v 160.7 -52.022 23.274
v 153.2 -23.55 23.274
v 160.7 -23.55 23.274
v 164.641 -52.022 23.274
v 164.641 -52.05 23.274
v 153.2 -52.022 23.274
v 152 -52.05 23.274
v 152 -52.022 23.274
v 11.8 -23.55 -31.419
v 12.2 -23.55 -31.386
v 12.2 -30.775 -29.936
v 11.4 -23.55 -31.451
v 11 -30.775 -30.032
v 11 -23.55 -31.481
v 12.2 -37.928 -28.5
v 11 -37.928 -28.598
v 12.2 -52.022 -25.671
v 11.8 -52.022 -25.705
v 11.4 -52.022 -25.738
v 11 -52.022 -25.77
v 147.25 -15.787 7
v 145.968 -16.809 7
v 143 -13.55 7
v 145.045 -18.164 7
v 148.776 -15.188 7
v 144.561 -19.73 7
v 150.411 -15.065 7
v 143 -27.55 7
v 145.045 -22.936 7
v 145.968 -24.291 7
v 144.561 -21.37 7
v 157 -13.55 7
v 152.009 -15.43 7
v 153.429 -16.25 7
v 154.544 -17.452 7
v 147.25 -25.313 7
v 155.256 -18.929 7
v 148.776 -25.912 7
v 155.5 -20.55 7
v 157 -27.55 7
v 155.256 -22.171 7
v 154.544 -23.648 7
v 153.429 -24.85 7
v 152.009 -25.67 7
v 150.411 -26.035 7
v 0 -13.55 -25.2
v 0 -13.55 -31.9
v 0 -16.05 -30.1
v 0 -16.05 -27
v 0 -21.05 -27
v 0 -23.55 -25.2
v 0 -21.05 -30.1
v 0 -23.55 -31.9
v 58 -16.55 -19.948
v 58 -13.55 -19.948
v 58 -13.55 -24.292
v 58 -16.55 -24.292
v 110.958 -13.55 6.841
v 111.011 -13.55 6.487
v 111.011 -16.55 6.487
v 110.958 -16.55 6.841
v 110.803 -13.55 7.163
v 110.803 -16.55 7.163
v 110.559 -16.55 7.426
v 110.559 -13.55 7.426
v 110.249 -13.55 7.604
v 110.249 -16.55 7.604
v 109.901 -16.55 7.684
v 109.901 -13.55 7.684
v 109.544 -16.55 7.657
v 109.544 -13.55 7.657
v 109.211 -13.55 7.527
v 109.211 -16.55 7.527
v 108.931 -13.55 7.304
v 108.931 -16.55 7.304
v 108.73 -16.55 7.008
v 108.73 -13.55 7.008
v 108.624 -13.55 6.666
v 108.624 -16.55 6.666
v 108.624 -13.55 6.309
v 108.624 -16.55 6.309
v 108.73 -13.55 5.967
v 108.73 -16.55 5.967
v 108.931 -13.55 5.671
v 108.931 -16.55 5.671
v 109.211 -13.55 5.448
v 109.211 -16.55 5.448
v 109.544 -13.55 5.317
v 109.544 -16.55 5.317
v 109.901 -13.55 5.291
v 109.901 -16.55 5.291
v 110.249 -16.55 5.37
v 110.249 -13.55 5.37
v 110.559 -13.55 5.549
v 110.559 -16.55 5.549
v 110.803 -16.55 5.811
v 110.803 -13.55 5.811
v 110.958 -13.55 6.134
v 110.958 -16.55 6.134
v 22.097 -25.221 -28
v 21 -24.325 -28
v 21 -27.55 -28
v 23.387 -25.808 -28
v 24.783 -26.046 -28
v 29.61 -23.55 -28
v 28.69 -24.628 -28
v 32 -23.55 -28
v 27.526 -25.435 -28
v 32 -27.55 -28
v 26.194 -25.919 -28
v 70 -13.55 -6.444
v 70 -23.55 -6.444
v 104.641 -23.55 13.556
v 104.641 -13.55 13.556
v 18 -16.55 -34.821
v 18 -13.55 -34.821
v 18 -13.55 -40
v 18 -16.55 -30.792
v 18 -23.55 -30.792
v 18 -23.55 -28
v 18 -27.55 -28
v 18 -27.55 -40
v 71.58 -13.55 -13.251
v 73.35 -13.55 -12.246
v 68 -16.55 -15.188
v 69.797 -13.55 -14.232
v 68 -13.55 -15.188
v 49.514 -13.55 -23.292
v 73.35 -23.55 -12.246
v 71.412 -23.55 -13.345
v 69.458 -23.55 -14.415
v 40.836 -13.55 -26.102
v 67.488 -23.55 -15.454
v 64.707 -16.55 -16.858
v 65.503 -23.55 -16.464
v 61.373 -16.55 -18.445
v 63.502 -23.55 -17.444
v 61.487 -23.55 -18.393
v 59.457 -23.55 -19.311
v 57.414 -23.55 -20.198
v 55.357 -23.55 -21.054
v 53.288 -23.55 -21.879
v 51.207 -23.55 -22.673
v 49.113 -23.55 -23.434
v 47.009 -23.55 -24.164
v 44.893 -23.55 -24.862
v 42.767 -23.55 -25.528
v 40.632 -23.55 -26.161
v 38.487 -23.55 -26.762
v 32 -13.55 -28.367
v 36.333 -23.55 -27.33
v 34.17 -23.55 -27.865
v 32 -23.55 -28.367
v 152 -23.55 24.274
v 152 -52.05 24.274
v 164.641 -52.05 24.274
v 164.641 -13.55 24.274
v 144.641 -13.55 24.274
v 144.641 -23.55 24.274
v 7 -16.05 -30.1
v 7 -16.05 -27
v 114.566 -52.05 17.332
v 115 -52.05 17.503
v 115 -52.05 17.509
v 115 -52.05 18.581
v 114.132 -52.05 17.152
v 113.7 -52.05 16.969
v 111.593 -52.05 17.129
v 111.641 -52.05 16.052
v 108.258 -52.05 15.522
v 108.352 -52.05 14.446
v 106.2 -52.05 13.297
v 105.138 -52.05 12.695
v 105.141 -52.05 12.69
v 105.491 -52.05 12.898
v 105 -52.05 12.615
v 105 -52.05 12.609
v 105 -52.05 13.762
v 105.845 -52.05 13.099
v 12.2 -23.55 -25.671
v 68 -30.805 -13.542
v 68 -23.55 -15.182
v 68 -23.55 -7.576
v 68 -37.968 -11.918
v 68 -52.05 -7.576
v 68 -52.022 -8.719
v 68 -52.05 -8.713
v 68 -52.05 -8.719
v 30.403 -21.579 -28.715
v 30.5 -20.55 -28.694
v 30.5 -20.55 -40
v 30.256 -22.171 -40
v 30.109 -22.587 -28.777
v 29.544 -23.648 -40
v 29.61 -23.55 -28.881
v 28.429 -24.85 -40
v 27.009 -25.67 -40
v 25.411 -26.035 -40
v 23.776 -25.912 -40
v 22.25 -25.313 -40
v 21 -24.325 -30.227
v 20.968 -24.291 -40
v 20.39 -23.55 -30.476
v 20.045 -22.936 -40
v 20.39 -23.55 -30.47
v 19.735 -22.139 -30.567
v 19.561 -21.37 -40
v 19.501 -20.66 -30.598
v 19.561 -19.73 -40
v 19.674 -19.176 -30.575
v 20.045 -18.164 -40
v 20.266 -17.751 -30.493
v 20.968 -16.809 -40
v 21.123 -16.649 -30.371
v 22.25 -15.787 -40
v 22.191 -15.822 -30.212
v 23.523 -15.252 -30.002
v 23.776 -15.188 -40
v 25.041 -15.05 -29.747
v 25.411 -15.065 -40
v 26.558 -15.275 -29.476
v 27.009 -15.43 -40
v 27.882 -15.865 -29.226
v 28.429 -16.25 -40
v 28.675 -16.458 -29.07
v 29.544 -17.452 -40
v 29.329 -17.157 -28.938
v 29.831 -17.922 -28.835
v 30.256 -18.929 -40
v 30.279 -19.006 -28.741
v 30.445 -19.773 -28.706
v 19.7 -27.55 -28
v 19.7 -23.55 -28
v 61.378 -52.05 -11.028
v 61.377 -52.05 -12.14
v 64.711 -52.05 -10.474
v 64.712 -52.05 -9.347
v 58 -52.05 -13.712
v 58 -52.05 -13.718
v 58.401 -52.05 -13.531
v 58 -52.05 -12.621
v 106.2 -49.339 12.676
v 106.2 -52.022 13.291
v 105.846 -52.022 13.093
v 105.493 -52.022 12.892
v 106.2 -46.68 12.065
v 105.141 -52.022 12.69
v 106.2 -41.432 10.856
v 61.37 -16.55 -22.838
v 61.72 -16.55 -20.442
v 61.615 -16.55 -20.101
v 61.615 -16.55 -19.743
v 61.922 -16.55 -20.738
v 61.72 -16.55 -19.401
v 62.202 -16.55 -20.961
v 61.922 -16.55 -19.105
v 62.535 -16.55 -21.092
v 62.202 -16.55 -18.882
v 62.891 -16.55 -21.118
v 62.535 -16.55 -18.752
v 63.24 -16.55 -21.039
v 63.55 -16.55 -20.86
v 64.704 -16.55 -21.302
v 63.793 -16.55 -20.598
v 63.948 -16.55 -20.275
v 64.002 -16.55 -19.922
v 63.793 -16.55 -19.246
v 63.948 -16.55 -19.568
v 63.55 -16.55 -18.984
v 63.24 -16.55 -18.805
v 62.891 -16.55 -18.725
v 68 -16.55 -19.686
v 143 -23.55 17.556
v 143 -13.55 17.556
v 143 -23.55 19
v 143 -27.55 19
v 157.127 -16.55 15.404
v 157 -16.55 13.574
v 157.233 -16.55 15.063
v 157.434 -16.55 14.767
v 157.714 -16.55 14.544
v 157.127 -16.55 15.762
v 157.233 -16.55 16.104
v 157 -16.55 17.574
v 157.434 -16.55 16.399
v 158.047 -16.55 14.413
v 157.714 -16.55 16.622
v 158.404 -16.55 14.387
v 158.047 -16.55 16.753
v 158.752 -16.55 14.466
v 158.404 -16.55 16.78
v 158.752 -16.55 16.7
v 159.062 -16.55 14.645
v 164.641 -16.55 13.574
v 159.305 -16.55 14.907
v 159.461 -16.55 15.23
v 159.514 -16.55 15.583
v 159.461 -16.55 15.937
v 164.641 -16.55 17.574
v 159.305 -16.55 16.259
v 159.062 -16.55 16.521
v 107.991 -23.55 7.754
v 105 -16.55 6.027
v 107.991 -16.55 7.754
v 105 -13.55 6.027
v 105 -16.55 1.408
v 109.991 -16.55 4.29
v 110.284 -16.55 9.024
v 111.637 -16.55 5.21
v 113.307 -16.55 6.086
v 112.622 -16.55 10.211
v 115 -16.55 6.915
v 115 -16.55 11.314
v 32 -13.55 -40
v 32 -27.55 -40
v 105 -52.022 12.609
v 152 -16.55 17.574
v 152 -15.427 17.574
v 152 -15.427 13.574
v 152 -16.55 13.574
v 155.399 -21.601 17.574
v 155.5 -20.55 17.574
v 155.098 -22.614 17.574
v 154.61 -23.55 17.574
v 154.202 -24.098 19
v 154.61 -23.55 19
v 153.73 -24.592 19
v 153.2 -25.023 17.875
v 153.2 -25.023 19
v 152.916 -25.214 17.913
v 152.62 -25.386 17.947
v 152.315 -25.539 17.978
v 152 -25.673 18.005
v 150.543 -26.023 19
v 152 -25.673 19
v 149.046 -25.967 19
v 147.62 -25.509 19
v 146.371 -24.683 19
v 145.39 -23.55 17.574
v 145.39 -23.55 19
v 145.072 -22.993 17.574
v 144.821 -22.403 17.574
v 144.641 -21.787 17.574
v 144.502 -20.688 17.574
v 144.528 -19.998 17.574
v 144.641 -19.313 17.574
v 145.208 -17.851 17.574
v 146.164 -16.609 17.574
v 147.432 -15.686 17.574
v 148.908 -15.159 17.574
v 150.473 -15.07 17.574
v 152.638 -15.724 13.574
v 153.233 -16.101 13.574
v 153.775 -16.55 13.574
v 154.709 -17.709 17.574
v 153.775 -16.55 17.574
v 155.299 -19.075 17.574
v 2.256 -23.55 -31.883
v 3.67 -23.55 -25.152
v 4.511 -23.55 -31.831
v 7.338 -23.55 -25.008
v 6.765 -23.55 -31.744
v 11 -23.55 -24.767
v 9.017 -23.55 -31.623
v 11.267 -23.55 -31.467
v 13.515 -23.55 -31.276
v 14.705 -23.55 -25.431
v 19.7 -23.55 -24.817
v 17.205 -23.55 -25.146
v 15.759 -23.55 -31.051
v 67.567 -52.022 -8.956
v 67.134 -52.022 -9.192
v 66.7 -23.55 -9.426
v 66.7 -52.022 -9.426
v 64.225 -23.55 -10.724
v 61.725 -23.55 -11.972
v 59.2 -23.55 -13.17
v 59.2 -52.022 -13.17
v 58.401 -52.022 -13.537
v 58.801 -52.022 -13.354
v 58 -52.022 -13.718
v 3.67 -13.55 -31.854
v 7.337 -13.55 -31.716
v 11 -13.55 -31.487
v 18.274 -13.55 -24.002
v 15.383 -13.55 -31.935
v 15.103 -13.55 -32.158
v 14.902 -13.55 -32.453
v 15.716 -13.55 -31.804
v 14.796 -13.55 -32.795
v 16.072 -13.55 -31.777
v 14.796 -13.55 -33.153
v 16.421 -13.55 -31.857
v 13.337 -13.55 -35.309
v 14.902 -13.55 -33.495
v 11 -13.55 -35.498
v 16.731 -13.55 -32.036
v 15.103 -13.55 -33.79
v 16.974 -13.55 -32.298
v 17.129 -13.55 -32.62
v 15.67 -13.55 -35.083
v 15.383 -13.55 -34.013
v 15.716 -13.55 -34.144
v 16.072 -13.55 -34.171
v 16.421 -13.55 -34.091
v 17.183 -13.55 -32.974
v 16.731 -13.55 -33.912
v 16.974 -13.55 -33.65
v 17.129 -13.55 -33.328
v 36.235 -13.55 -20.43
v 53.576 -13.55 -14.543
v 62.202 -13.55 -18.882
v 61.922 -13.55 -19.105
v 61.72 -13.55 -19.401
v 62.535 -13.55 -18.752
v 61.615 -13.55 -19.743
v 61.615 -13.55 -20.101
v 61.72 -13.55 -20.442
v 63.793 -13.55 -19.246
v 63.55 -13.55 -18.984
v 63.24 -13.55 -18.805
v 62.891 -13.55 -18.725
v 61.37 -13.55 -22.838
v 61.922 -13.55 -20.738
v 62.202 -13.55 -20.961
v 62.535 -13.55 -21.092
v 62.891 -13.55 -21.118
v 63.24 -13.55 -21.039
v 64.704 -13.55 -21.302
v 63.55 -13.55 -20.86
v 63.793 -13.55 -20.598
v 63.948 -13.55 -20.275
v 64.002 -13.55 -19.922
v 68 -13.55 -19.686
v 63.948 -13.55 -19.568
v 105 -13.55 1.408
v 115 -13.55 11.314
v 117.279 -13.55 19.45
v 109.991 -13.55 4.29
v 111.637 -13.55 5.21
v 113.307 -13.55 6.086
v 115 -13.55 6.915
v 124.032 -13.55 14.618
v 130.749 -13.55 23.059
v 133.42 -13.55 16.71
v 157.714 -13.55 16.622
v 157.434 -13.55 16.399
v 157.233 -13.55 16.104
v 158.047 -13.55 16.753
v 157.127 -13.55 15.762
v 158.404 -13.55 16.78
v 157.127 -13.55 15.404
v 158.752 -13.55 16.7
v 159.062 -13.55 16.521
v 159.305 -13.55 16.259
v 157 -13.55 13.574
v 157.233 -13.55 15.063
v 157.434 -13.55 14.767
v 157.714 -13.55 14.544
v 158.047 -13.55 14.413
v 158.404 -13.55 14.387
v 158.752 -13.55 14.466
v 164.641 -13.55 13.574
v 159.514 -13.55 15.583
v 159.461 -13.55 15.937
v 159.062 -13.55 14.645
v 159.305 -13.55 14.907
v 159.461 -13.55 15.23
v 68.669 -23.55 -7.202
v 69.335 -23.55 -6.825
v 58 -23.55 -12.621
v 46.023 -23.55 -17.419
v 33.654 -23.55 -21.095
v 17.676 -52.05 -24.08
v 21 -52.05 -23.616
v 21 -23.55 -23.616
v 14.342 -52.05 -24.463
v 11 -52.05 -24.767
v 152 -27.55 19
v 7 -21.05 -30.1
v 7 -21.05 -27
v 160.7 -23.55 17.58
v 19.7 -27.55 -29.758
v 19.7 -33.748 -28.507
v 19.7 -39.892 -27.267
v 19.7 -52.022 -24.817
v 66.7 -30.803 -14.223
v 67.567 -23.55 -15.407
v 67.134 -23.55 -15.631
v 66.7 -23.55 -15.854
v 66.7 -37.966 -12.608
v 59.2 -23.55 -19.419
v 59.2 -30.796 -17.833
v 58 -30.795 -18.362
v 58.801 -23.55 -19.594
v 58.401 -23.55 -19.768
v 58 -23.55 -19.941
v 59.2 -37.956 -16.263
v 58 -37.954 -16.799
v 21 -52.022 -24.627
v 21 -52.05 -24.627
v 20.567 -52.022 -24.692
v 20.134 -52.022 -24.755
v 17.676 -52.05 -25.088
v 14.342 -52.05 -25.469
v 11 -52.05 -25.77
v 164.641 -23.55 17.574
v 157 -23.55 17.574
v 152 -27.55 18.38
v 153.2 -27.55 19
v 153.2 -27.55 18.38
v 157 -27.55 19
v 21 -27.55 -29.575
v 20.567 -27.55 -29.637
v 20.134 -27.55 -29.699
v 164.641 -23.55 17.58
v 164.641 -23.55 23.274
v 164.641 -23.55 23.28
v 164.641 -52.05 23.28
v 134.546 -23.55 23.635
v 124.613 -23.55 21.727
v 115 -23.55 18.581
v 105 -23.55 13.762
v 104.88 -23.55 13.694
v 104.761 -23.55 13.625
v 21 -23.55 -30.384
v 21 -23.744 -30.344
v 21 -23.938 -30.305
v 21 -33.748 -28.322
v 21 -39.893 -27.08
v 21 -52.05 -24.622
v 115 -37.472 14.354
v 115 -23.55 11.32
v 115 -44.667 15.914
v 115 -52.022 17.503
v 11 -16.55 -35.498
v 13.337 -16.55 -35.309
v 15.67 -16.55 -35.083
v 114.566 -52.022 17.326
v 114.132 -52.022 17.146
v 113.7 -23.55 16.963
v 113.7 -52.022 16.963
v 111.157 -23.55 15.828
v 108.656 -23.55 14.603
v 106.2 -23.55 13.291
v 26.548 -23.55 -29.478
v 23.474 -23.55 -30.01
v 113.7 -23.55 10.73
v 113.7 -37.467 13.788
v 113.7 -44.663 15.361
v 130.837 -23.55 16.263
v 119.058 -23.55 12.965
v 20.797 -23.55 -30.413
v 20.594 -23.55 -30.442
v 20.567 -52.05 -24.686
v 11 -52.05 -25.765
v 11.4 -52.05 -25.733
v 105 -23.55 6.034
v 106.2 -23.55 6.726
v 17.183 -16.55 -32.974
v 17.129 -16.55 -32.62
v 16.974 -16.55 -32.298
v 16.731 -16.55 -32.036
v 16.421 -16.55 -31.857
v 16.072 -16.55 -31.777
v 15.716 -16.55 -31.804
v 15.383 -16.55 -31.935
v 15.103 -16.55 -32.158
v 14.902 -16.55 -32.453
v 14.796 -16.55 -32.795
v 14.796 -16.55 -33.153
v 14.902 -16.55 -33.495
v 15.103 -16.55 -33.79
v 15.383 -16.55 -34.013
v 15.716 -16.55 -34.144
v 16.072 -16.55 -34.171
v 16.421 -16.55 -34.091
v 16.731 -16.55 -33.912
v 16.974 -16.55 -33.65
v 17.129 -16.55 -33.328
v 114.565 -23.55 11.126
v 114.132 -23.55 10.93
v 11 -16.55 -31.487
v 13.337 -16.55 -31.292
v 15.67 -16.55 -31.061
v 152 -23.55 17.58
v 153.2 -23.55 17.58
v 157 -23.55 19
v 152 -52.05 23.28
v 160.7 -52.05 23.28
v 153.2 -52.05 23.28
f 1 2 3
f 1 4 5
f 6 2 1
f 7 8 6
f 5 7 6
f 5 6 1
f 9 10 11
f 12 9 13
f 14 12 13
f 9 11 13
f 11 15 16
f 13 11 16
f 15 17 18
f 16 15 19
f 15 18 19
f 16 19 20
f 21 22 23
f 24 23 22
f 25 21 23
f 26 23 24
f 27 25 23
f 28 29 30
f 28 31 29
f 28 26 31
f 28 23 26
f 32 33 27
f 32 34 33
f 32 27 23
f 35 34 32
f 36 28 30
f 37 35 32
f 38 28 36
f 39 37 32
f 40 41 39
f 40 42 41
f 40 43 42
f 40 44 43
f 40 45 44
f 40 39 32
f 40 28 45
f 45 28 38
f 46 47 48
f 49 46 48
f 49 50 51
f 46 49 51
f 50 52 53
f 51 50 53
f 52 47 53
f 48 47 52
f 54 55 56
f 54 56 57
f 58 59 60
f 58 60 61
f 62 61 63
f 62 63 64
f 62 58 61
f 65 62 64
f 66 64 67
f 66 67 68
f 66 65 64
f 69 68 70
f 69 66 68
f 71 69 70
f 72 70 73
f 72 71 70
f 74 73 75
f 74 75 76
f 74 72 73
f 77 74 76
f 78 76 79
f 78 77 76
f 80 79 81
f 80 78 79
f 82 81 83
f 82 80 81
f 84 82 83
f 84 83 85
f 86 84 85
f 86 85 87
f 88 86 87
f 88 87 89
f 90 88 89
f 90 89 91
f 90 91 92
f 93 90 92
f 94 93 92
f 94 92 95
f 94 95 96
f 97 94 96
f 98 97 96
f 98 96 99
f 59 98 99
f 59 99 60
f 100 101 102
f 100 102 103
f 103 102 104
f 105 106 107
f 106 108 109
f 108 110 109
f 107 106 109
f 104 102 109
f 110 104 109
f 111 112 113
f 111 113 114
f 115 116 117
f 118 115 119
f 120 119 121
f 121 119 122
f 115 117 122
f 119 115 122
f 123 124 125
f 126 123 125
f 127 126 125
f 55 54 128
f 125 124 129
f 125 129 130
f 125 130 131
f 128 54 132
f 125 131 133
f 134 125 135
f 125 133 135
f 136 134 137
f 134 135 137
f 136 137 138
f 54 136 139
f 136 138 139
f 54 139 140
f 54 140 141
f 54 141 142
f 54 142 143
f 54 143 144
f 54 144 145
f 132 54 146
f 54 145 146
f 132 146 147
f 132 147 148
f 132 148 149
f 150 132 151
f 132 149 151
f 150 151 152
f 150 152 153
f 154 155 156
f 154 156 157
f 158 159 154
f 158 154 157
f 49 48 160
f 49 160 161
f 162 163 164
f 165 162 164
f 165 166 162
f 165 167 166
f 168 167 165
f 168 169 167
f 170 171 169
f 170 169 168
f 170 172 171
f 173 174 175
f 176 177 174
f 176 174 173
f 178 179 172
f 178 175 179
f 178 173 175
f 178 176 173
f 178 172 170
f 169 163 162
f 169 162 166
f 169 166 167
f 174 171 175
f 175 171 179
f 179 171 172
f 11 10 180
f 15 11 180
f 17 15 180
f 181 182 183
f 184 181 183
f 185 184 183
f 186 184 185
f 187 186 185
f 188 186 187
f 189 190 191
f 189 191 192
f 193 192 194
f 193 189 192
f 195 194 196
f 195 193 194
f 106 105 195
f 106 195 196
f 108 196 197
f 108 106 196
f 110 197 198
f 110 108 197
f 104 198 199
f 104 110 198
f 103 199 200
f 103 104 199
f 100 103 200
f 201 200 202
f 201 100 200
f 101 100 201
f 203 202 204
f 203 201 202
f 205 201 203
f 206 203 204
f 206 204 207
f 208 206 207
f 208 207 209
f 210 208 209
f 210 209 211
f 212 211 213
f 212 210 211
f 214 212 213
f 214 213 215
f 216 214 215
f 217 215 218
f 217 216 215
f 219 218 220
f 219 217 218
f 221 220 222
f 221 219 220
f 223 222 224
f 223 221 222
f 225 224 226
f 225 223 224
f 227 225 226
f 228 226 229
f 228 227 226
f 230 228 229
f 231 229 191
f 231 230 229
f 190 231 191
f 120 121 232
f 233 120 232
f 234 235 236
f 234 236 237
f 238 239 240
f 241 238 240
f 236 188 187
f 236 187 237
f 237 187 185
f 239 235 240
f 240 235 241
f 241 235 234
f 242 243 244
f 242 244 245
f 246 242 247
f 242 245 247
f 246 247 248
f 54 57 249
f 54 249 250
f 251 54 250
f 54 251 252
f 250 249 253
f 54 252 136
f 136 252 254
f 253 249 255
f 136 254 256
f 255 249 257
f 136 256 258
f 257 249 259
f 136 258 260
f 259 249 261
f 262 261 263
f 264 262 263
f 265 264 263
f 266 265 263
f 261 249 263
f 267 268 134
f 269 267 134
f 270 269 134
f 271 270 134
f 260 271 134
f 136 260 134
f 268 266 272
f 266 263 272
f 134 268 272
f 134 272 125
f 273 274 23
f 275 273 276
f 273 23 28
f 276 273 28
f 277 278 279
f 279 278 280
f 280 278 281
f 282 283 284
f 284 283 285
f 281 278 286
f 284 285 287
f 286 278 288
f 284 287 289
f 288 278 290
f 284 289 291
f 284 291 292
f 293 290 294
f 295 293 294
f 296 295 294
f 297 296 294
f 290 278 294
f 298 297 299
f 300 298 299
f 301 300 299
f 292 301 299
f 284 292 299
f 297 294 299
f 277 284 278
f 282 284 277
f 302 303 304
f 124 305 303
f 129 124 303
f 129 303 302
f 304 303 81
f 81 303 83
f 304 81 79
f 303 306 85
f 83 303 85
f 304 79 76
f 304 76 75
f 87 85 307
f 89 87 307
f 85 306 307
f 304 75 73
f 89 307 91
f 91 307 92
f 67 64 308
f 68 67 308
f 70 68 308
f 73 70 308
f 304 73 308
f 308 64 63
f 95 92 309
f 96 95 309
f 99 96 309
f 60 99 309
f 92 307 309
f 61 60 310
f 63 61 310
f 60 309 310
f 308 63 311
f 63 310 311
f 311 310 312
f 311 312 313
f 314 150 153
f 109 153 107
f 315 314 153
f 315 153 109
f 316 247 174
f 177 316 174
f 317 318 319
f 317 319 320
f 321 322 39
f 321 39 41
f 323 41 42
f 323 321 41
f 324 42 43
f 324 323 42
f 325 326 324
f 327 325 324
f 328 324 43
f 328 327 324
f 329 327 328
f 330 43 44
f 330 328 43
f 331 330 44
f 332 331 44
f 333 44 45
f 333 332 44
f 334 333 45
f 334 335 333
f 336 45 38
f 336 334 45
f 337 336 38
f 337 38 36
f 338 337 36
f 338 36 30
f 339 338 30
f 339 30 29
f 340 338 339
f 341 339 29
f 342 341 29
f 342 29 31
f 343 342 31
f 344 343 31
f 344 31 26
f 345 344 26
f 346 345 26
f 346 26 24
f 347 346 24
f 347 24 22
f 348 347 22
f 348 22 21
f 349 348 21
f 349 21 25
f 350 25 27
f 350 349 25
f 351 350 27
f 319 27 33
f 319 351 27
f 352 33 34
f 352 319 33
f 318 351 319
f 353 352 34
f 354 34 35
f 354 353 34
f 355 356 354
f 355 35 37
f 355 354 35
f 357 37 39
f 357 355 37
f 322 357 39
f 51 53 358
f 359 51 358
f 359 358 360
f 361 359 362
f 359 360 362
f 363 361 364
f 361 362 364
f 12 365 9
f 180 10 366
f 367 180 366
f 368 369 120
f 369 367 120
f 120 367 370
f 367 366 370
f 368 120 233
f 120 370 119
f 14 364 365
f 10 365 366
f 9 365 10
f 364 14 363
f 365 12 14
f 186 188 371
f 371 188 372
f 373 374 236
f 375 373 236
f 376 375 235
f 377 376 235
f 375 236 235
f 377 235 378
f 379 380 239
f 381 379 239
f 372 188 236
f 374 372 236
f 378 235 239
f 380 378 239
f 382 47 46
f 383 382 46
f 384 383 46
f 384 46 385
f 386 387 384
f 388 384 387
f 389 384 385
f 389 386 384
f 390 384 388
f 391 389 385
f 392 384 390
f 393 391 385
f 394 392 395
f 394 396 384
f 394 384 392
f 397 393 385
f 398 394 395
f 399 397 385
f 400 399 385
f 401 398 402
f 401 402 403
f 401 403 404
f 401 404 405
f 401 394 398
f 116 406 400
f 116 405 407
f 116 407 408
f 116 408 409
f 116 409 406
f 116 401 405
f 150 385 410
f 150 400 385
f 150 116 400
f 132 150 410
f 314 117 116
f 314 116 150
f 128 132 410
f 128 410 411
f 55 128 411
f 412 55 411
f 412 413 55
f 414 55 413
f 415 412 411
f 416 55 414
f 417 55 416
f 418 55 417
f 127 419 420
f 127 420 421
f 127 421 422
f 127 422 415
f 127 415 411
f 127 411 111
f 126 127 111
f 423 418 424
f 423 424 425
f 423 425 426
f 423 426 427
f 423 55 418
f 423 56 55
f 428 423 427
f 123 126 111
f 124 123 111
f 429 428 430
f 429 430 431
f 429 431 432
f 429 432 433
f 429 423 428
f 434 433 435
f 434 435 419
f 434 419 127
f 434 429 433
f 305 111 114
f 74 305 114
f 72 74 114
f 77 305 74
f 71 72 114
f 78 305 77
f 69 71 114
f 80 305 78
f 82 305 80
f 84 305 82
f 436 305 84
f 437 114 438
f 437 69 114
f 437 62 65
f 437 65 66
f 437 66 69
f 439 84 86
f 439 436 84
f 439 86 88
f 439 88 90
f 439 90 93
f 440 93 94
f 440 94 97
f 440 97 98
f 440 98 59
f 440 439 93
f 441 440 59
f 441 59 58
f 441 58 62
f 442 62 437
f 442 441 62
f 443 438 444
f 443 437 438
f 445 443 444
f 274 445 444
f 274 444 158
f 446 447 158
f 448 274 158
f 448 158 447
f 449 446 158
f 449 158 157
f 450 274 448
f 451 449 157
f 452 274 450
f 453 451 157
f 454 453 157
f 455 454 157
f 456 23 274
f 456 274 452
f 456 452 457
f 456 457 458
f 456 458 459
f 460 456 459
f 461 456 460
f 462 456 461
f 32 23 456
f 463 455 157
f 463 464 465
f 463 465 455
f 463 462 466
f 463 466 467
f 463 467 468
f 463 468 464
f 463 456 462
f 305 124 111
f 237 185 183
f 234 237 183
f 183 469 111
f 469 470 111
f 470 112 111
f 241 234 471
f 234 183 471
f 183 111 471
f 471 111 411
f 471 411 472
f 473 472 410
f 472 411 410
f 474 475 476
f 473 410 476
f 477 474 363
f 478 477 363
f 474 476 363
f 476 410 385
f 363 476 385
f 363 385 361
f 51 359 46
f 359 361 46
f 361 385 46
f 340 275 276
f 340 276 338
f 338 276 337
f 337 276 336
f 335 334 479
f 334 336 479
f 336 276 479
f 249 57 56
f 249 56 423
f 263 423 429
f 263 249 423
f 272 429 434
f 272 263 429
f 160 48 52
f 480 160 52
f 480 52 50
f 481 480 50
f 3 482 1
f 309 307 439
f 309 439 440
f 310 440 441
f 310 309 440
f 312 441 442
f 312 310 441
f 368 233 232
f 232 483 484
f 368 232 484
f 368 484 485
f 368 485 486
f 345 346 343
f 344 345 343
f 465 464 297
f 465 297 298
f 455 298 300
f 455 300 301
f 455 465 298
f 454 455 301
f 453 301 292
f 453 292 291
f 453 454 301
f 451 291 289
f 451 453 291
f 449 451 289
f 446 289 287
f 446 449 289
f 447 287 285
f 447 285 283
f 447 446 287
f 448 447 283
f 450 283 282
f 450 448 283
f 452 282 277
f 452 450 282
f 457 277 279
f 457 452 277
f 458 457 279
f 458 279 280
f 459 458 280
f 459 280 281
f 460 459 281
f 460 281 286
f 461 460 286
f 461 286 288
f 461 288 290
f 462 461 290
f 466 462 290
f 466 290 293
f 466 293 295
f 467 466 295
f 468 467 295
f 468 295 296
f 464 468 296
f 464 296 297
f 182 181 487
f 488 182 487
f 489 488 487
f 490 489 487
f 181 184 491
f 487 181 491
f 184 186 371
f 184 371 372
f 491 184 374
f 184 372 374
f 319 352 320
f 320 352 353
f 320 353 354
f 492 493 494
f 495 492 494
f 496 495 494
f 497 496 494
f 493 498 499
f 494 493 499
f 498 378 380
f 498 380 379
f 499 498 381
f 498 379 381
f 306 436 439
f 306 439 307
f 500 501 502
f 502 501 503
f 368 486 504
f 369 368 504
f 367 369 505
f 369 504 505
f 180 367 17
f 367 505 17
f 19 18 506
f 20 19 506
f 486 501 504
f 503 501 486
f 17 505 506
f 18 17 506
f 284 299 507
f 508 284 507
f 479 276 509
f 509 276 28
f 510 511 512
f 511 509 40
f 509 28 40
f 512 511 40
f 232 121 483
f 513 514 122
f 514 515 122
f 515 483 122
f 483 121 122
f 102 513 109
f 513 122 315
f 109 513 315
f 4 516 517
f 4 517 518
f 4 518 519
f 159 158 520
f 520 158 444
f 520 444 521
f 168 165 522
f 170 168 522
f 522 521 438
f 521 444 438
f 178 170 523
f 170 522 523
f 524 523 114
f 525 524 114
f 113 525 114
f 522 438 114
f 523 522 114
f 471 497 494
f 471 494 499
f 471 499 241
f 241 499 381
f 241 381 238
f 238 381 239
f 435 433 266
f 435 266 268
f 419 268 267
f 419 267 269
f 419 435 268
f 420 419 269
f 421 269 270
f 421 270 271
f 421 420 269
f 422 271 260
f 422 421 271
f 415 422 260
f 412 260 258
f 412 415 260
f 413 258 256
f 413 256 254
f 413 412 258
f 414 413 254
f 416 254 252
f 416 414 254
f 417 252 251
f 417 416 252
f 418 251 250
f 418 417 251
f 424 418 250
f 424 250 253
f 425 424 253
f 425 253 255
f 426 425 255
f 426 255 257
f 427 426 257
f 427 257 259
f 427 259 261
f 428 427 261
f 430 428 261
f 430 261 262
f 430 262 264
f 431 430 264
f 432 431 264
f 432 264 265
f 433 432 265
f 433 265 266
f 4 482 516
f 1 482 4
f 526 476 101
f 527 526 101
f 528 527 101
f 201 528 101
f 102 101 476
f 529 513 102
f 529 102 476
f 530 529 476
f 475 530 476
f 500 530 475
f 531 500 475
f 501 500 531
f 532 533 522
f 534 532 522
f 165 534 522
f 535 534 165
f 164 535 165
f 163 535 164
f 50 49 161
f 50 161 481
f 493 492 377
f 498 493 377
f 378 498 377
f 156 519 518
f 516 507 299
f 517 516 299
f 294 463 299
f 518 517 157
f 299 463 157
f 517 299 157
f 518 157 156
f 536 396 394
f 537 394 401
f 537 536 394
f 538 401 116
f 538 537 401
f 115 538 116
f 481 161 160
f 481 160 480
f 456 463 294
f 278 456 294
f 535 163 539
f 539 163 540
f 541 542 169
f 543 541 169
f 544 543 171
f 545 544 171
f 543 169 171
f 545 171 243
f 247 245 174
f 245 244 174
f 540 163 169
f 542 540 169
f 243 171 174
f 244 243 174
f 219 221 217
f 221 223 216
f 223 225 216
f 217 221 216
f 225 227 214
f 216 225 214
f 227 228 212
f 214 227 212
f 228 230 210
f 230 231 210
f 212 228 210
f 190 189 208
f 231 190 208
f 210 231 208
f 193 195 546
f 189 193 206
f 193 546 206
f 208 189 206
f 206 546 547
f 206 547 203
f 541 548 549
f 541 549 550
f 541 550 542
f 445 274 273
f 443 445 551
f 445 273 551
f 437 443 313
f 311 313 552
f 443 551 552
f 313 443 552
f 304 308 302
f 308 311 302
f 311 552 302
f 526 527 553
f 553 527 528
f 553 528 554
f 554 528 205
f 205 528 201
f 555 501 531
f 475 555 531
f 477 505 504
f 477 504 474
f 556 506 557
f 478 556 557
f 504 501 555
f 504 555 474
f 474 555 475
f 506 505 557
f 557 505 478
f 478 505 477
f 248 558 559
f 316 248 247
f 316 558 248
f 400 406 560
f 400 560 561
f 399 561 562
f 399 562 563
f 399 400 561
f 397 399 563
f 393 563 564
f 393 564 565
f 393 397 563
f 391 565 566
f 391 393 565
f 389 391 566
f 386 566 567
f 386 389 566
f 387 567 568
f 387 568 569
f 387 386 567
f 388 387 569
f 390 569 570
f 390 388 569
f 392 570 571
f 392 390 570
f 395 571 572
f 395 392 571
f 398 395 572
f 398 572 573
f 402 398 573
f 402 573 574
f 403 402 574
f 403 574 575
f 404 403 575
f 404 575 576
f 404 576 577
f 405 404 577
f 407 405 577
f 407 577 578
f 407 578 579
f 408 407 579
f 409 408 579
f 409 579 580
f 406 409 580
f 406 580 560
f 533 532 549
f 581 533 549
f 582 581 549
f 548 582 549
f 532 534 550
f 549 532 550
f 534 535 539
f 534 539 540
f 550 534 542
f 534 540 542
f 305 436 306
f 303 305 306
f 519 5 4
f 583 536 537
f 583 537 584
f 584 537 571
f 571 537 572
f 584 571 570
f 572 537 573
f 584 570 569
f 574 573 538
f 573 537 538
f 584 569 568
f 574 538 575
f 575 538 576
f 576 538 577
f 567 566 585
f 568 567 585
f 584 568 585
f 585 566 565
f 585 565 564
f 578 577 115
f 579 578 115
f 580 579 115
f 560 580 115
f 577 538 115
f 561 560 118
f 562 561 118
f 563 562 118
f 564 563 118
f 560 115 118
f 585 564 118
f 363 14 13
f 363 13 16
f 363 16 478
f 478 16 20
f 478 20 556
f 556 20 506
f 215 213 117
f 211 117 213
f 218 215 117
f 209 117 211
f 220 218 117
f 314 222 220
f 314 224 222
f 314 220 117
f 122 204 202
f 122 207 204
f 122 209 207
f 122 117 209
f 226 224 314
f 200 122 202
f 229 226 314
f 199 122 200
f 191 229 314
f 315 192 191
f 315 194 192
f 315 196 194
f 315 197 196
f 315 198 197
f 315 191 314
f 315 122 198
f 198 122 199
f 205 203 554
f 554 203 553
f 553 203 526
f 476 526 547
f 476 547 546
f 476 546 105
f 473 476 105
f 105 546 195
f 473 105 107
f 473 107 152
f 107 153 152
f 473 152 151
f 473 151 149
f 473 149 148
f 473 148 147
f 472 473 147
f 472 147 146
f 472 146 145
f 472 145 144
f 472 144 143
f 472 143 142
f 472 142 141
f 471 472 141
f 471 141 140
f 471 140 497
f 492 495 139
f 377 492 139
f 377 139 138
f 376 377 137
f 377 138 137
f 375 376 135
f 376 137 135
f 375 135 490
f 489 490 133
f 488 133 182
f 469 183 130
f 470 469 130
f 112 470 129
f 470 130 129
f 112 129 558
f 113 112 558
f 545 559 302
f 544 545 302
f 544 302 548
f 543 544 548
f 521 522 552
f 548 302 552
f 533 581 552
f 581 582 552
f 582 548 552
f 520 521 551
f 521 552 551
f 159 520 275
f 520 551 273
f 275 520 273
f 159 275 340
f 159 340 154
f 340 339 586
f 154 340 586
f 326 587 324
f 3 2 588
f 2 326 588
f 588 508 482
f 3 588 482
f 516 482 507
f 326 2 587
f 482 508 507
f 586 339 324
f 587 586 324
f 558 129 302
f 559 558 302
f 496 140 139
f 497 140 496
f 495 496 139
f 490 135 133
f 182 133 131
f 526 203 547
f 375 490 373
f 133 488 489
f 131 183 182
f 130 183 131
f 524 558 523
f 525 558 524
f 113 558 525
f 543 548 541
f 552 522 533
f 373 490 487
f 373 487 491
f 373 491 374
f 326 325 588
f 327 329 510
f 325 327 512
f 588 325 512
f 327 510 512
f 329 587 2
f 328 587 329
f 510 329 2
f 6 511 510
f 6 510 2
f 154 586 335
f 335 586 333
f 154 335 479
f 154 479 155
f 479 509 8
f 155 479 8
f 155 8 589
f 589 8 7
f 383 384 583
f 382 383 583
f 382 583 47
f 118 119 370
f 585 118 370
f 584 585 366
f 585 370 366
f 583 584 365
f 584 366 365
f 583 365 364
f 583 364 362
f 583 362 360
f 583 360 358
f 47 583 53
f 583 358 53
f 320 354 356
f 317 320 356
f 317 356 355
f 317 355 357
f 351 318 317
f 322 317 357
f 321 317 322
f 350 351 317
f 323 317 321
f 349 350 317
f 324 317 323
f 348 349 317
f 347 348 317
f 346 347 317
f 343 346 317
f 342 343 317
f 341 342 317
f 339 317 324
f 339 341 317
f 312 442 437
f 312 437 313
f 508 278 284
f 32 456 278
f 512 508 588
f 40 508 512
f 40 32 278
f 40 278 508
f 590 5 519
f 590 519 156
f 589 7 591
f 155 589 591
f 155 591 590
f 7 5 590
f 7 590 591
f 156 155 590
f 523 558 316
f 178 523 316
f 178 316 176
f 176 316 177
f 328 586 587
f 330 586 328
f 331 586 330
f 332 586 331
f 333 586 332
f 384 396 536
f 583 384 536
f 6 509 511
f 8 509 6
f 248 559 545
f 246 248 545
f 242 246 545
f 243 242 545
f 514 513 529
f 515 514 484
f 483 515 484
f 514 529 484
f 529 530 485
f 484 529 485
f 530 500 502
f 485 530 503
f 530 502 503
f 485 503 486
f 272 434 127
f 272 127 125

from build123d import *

# Parameters (mm, degrees)
SKETCH038_W            = 5
SKETCH038_H            = 3.1
EXTRUDE001_DEPTH       = 7
BOX010_W               = 200
BOX010_H               = 100
BOX010_DEPTH           = 100
BOX008_W               = 20
BOX008_H               = 20
BOX008_DEPTH           = 20
BOX008_PLACEMENT_ANGLE = 30
BOX011_W               = 14
BOX011_H               = 14
BOX011_DEPTH           = 20
SKETCH039_R            = 5.5
POCKET007_DEPTH        = 20.001
BOX014_W               = 7.5
BOX014_H               = 60
BOX014_DEPTH           = 200
ARRAY002_X_COUNT       = 7
ARRAY002_X_PITCH       = 47
BOX006_W               = 37
BOX006_H               = 60
BOX006_DEPTH           = 200
ARRAY_X_COUNT          = 6
ARRAY_X_PITCH          = 47
BOX012_W               = 14
BOX012_H               = 14
BOX012_DEPTH           = 12
SKETCH032_R            = 5.5
POCKET009_DEPTH        = 12.001
BOX013_W               = 14
BOX013_H               = 14
BOX013_DEPTH           = 12
SKETCH034_R            = 5.5
POCKET008_DEPTH        = 12.001
BOX009_W               = 37
BOX009_H               = 60
BOX009_DEPTH           = 200
ARRAY001_X_COUNT       = 6
ARRAY001_X_PITCH       = 47
SKETCH035_W            = 3
SKETCH035_H            = 4
SKETCH036_R            = 1.2
POCKET006_DEPTH        = 3.001


with BuildPart() as extrude001:
    # Sketch038 → Extrude001 (new body)
    with BuildSketch(Plane.YZ):
        with Locations((13.55, -28.55)):
            Rectangle(SKETCH038_W, SKETCH038_H)
    extrude(amount=EXTRUDE001_DEPTH)


with BuildPart() as bigleft:
    # Box010 → Box010 (new body)
    with BuildSketch(Plane(origin=(0, -50, -50), x_dir=(1, 0, 0), z_dir=(0, 0, 1))):
        with Locations((100, 50)):
            Rectangle(BOX010_W, BOX010_H)
    extrude(amount=BOX010_DEPTH)


with BuildPart() as pillar_cut_cube_l:
    # Box008 → Box008 (new body)
    with BuildSketch(Plane.XY):
        with Locations((10, 10)):
            Rectangle(BOX008_W, BOX008_H)
    extrude(amount=BOX008_DEPTH)


with BuildPart() as pillar_cut_cube_l_1:
    # Box008 placement: moved
    add(pillar_cut_cube_l.part.moved(Location((-127.001, 5, 20.4905))).rotate(Axis((-127.001, 5, 20.4905), (0, 1, 0)), BOX008_PLACEMENT_ANGLE))


with BuildPart() as cut011:
    # Box011 → Box011 (new body)
    with BuildSketch(Plane(origin=(-125, 8.55, 0), x_dir=(1, 0, 0), z_dir=(0, 0, 1))):
        with Locations((7, 7)):
            Rectangle(BOX011_W, BOX011_H)
    extrude(amount=BOX011_DEPTH)

    # Sketch039 → Pocket007 (cut, through all)
    with BuildSketch(Plane(origin=(-125, 8.55, 20), x_dir=(1, 0, 0), z_dir=(0, 0, 1))):
        with Locations((7, 7)):
            Circle(SKETCH039_R)
    extrude(amount=-POCKET007_DEPTH, mode=Mode.SUBTRACT)

    # Cut011: cut pillar_cut_cube_l
    add(pillar_cut_cube_l_1.part, mode=Mode.SUBTRACT)


with BuildPart() as array002:
    # Box014 → Box014 (new body)
    with BuildSketch(Plane(origin=(-128.8, 18.55, -100), x_dir=(1, 0, 0), z_dir=(0, 0, 1))):
        with Locations((3.75, 30)):
            Rectangle(BOX014_W, BOX014_H)
    extrude(amount=BOX014_DEPTH)

    # Array002 X: Array002 ×7


with BuildPart() as array002_1:
    add(array002.part)
    with Locations(*[(i * ARRAY002_X_PITCH, 0, 0) for i in range(1, ARRAY002_X_COUNT)]):
        add(array002.part)


with BuildPart() as rail_cut_cube_array_b:
    # Box006 → Box006 (new body)
    with BuildSketch(Plane(origin=(-120, 18.55, -100), x_dir=(1, 0, 0), z_dir=(0, 0, 1))):
        with Locations((18.5, 30)):
            Rectangle(BOX006_W, BOX006_H)
    extrude(amount=BOX006_DEPTH)

    # Array X: rail_cut_cube_array_b ×6


with BuildPart() as rail_cut_cube_array_b_1:
    add(rail_cut_cube_array_b.part)
    with Locations(*[(i * ARRAY_X_PITCH, 0, 0) for i in range(1, ARRAY_X_COUNT)]):
        add(rail_cut_cube_array_b.part)


with BuildPart() as cut013:
    # Sweep002: sweep along a path in Sketch028
    with BuildLine(Plane.XZ) as sweep002_path:
        Line((164.641016, 24.27441), (144.641016, 24.27441))
        ThreePointArc((144.641016, 24.27441), (123.935493, 21.548477), (104.641016, 13.556443))
        Line((104.641016, 13.556443), (70, -6.443557))
        ThreePointArc((70, -6.443557), (0, -25.2), (-70, -6.443557))
        Line((-70, -6.443557), (-130.621778, 28.556443))
    # Sketch043 → Sweep002 (sweep)
    with BuildSketch(Plane.YZ.offset(164.641016)):
        Polygon((18.55, 17.58), (47.05, 23.28), (18.55, 23.28), align=None)
    sweep(path=sweep002_path.line)

    # Cut012: cut rail_cut_cube_array_b
    add(rail_cut_cube_array_b_1.part, mode=Mode.SUBTRACT)

    # Cut013: cut Array002
    add(array002_1.part, mode=Mode.SUBTRACT)


with BuildPart() as rail_cut_b:
    # Sweep: sweep along a path in Sketch028
    with BuildLine(Plane.XZ) as sweep_path:
        Line((164.641016, 24.27441), (144.641016, 24.27441))
        ThreePointArc((144.641016, 24.27441), (123.935493, 21.548477), (104.641016, 13.556443))
        Line((104.641016, 13.556443), (70, -6.443557))
        ThreePointArc((70, -6.443557), (0, -25.2), (-70, -6.443557))
        Line((-70, -6.443557), (-130.621778, 28.556443))
    # Sketch029 → Sweep (sweep)
    with BuildSketch(Plane.YZ):
        Polygon((-19.25, -25.2), (-19.25, -31.9), (-9.25, -31.9), (-9.25, -26.2), (19.25, -26.2), (19.25, -25.2), align=None)
    sweep(path=sweep_path.line)


with BuildPart() as rail_cut_b_1:
    # Sweep placement: moved
    add(rail_cut_b.part.moved(Location((0, 27.8, 0))))

    # Cut007: cut rail_cut_cube_array_b
    add(rail_cut_cube_array_b_1.part, mode=Mode.SUBTRACT)


with BuildPart() as pillar_hollow_r:
    # Box012 → Box012 (new body)
    with BuildSketch(Plane(origin=(143, 8.55, 7), x_dir=(1, 0, 0), z_dir=(0, 0, 1))):
        with Locations((7, 7)):
            Rectangle(BOX012_W, BOX012_H)
    extrude(amount=BOX012_DEPTH)

    # Sketch032 → Pocket009 (cut, through all)
    with BuildSketch(Plane(origin=(143, 8.55, 19), x_dir=(1, 0, 0), z_dir=(0, 0, 1))):
        with Locations((7, 7)):
            Circle(SKETCH032_R)
    extrude(amount=-POCKET009_DEPTH, mode=Mode.SUBTRACT)


with BuildPart() as pillar_hollow_m:
    # Box013 → Box013 (new body)
    with BuildSketch(Plane(origin=(18, 8.55, -40), x_dir=(1, 0, 0), z_dir=(0, 0, 1))):
        with Locations((7, 7)):
            Rectangle(BOX013_W, BOX013_H)
    extrude(amount=BOX013_DEPTH)

    # Sketch034 → Pocket008 (cut, through all)
    with BuildSketch(Plane(origin=(18, 8.55, -28), x_dir=(1, 0, 0), z_dir=(0, 0, 1))):
        with Locations((7, 7)):
            Circle(SKETCH034_R)
    extrude(amount=-POCKET008_DEPTH, mode=Mode.SUBTRACT)


with BuildPart() as mount_cube_array_b:
    # Box009 → Box009 (new body)
    with BuildSketch(Plane(origin=(-120, 18.55, -100), x_dir=(1, 0, 0), z_dir=(0, 0, 1))):
        with Locations((18.5, 30)):
            Rectangle(BOX009_W, BOX009_H)
    extrude(amount=BOX009_DEPTH)

    # Array001 X: mount_cube_array_b ×6


with BuildPart() as mount_cube_array_b_1:
    add(mount_cube_array_b.part)
    with Locations(*[(i * ARRAY001_X_PITCH, 0, 0) for i in range(1, ARRAY001_X_COUNT)]):
        add(mount_cube_array_b.part)


with BuildPart() as mount_cube_array_b_2:
    # Array001 placement: moved
    add(mount_cube_array_b_1.part.moved(Location((0, -30, 0))))


with BuildPart() as clone_of_cut015:
    # Sweep001: sweep along a path in Sketch028
    with BuildLine(Plane.XZ) as sweep001_path:
        Line((-130.621778, 28.556443), (-70, -6.443557))
        ThreePointArc((-70, -6.443557), (0, -25.2), (70, -6.443557))
        Line((70, -6.443557), (104.641016, 13.556443))
        ThreePointArc((104.641016, 13.556443), (123.935493, 21.548477), (144.641016, 24.27441))
        Line((144.641016, 24.27441), (164.641016, 24.27441))
    # Sketch035 → Sweep001 (sweep)
    with BuildSketch(Plane.YZ):
        with Locations((-17.75, -33.9)):
            Rectangle(SKETCH035_W, SKETCH035_H)
    sweep(path=sweep001_path.line)


with BuildPart() as clone_of_cut015_1:
    # Sweep001 placement: moved
    add(clone_of_cut015.part.moved(Location((0, 27.8, 0))))

    # Sketch036 → Pocket006 (cut, through all)
    with BuildSketch(Plane.XZ.offset(-8.55)):
        with Locations((-127.361382, 16.612761)):
            Circle(SKETCH036_R)
        with Locations((-78.25576, -11.759304)):
            Circle(SKETCH036_R)
        with Locations((-31.170284, -30.615305)):
            Circle(SKETCH036_R)
        with Locations((15.982787, -32.973976)):
            Circle(SKETCH036_R)
        with Locations((62.801571, -19.921701)):
            Circle(SKETCH036_R)
        with Locations((109.81105, 6.487408)):
            Circle(SKETCH036_R)
        with Locations((158.314011, 15.583238)):
            Circle(SKETCH036_R)
    extrude(amount=-POCKET006_DEPTH, mode=Mode.SUBTRACT)

    # Cut010: cut mount_cube_array_b
    add(mount_cube_array_b_2.part, mode=Mode.SUBTRACT)

    # Fusion003: union Cut011, Cut013, rail_cut_b, pillar_hollow_r, pillar_hollow_m
    add(cut011.part)
    add(cut013.part)
    add(rail_cut_b_1.part)
    add(pillar_hollow_r.part)
    add(pillar_hollow_m.part)

    # Common: intersect bigleft
    add(bigleft.part, mode=Mode.INTERSECT)

    # Cut015: cut Extrude001
    add(extrude001.part, mode=Mode.SUBTRACT)


with BuildPart() as rail_fr:
    # Part__Mirroring001: instance of Clone of Cut015
    add(clone_of_cut015_1.part.mirror(Plane(origin=(82.320511, 0, -4.567103), x_dir=(1, 0, 0), z_dir=(0, 1, 0))))


with BuildPart() as rail_fr_1:
    # Part__Mirroring001 placement: moved
    add(rail_fr.part.moved(Location((0, -5, 0))))


solid = rail_fr_1.part
